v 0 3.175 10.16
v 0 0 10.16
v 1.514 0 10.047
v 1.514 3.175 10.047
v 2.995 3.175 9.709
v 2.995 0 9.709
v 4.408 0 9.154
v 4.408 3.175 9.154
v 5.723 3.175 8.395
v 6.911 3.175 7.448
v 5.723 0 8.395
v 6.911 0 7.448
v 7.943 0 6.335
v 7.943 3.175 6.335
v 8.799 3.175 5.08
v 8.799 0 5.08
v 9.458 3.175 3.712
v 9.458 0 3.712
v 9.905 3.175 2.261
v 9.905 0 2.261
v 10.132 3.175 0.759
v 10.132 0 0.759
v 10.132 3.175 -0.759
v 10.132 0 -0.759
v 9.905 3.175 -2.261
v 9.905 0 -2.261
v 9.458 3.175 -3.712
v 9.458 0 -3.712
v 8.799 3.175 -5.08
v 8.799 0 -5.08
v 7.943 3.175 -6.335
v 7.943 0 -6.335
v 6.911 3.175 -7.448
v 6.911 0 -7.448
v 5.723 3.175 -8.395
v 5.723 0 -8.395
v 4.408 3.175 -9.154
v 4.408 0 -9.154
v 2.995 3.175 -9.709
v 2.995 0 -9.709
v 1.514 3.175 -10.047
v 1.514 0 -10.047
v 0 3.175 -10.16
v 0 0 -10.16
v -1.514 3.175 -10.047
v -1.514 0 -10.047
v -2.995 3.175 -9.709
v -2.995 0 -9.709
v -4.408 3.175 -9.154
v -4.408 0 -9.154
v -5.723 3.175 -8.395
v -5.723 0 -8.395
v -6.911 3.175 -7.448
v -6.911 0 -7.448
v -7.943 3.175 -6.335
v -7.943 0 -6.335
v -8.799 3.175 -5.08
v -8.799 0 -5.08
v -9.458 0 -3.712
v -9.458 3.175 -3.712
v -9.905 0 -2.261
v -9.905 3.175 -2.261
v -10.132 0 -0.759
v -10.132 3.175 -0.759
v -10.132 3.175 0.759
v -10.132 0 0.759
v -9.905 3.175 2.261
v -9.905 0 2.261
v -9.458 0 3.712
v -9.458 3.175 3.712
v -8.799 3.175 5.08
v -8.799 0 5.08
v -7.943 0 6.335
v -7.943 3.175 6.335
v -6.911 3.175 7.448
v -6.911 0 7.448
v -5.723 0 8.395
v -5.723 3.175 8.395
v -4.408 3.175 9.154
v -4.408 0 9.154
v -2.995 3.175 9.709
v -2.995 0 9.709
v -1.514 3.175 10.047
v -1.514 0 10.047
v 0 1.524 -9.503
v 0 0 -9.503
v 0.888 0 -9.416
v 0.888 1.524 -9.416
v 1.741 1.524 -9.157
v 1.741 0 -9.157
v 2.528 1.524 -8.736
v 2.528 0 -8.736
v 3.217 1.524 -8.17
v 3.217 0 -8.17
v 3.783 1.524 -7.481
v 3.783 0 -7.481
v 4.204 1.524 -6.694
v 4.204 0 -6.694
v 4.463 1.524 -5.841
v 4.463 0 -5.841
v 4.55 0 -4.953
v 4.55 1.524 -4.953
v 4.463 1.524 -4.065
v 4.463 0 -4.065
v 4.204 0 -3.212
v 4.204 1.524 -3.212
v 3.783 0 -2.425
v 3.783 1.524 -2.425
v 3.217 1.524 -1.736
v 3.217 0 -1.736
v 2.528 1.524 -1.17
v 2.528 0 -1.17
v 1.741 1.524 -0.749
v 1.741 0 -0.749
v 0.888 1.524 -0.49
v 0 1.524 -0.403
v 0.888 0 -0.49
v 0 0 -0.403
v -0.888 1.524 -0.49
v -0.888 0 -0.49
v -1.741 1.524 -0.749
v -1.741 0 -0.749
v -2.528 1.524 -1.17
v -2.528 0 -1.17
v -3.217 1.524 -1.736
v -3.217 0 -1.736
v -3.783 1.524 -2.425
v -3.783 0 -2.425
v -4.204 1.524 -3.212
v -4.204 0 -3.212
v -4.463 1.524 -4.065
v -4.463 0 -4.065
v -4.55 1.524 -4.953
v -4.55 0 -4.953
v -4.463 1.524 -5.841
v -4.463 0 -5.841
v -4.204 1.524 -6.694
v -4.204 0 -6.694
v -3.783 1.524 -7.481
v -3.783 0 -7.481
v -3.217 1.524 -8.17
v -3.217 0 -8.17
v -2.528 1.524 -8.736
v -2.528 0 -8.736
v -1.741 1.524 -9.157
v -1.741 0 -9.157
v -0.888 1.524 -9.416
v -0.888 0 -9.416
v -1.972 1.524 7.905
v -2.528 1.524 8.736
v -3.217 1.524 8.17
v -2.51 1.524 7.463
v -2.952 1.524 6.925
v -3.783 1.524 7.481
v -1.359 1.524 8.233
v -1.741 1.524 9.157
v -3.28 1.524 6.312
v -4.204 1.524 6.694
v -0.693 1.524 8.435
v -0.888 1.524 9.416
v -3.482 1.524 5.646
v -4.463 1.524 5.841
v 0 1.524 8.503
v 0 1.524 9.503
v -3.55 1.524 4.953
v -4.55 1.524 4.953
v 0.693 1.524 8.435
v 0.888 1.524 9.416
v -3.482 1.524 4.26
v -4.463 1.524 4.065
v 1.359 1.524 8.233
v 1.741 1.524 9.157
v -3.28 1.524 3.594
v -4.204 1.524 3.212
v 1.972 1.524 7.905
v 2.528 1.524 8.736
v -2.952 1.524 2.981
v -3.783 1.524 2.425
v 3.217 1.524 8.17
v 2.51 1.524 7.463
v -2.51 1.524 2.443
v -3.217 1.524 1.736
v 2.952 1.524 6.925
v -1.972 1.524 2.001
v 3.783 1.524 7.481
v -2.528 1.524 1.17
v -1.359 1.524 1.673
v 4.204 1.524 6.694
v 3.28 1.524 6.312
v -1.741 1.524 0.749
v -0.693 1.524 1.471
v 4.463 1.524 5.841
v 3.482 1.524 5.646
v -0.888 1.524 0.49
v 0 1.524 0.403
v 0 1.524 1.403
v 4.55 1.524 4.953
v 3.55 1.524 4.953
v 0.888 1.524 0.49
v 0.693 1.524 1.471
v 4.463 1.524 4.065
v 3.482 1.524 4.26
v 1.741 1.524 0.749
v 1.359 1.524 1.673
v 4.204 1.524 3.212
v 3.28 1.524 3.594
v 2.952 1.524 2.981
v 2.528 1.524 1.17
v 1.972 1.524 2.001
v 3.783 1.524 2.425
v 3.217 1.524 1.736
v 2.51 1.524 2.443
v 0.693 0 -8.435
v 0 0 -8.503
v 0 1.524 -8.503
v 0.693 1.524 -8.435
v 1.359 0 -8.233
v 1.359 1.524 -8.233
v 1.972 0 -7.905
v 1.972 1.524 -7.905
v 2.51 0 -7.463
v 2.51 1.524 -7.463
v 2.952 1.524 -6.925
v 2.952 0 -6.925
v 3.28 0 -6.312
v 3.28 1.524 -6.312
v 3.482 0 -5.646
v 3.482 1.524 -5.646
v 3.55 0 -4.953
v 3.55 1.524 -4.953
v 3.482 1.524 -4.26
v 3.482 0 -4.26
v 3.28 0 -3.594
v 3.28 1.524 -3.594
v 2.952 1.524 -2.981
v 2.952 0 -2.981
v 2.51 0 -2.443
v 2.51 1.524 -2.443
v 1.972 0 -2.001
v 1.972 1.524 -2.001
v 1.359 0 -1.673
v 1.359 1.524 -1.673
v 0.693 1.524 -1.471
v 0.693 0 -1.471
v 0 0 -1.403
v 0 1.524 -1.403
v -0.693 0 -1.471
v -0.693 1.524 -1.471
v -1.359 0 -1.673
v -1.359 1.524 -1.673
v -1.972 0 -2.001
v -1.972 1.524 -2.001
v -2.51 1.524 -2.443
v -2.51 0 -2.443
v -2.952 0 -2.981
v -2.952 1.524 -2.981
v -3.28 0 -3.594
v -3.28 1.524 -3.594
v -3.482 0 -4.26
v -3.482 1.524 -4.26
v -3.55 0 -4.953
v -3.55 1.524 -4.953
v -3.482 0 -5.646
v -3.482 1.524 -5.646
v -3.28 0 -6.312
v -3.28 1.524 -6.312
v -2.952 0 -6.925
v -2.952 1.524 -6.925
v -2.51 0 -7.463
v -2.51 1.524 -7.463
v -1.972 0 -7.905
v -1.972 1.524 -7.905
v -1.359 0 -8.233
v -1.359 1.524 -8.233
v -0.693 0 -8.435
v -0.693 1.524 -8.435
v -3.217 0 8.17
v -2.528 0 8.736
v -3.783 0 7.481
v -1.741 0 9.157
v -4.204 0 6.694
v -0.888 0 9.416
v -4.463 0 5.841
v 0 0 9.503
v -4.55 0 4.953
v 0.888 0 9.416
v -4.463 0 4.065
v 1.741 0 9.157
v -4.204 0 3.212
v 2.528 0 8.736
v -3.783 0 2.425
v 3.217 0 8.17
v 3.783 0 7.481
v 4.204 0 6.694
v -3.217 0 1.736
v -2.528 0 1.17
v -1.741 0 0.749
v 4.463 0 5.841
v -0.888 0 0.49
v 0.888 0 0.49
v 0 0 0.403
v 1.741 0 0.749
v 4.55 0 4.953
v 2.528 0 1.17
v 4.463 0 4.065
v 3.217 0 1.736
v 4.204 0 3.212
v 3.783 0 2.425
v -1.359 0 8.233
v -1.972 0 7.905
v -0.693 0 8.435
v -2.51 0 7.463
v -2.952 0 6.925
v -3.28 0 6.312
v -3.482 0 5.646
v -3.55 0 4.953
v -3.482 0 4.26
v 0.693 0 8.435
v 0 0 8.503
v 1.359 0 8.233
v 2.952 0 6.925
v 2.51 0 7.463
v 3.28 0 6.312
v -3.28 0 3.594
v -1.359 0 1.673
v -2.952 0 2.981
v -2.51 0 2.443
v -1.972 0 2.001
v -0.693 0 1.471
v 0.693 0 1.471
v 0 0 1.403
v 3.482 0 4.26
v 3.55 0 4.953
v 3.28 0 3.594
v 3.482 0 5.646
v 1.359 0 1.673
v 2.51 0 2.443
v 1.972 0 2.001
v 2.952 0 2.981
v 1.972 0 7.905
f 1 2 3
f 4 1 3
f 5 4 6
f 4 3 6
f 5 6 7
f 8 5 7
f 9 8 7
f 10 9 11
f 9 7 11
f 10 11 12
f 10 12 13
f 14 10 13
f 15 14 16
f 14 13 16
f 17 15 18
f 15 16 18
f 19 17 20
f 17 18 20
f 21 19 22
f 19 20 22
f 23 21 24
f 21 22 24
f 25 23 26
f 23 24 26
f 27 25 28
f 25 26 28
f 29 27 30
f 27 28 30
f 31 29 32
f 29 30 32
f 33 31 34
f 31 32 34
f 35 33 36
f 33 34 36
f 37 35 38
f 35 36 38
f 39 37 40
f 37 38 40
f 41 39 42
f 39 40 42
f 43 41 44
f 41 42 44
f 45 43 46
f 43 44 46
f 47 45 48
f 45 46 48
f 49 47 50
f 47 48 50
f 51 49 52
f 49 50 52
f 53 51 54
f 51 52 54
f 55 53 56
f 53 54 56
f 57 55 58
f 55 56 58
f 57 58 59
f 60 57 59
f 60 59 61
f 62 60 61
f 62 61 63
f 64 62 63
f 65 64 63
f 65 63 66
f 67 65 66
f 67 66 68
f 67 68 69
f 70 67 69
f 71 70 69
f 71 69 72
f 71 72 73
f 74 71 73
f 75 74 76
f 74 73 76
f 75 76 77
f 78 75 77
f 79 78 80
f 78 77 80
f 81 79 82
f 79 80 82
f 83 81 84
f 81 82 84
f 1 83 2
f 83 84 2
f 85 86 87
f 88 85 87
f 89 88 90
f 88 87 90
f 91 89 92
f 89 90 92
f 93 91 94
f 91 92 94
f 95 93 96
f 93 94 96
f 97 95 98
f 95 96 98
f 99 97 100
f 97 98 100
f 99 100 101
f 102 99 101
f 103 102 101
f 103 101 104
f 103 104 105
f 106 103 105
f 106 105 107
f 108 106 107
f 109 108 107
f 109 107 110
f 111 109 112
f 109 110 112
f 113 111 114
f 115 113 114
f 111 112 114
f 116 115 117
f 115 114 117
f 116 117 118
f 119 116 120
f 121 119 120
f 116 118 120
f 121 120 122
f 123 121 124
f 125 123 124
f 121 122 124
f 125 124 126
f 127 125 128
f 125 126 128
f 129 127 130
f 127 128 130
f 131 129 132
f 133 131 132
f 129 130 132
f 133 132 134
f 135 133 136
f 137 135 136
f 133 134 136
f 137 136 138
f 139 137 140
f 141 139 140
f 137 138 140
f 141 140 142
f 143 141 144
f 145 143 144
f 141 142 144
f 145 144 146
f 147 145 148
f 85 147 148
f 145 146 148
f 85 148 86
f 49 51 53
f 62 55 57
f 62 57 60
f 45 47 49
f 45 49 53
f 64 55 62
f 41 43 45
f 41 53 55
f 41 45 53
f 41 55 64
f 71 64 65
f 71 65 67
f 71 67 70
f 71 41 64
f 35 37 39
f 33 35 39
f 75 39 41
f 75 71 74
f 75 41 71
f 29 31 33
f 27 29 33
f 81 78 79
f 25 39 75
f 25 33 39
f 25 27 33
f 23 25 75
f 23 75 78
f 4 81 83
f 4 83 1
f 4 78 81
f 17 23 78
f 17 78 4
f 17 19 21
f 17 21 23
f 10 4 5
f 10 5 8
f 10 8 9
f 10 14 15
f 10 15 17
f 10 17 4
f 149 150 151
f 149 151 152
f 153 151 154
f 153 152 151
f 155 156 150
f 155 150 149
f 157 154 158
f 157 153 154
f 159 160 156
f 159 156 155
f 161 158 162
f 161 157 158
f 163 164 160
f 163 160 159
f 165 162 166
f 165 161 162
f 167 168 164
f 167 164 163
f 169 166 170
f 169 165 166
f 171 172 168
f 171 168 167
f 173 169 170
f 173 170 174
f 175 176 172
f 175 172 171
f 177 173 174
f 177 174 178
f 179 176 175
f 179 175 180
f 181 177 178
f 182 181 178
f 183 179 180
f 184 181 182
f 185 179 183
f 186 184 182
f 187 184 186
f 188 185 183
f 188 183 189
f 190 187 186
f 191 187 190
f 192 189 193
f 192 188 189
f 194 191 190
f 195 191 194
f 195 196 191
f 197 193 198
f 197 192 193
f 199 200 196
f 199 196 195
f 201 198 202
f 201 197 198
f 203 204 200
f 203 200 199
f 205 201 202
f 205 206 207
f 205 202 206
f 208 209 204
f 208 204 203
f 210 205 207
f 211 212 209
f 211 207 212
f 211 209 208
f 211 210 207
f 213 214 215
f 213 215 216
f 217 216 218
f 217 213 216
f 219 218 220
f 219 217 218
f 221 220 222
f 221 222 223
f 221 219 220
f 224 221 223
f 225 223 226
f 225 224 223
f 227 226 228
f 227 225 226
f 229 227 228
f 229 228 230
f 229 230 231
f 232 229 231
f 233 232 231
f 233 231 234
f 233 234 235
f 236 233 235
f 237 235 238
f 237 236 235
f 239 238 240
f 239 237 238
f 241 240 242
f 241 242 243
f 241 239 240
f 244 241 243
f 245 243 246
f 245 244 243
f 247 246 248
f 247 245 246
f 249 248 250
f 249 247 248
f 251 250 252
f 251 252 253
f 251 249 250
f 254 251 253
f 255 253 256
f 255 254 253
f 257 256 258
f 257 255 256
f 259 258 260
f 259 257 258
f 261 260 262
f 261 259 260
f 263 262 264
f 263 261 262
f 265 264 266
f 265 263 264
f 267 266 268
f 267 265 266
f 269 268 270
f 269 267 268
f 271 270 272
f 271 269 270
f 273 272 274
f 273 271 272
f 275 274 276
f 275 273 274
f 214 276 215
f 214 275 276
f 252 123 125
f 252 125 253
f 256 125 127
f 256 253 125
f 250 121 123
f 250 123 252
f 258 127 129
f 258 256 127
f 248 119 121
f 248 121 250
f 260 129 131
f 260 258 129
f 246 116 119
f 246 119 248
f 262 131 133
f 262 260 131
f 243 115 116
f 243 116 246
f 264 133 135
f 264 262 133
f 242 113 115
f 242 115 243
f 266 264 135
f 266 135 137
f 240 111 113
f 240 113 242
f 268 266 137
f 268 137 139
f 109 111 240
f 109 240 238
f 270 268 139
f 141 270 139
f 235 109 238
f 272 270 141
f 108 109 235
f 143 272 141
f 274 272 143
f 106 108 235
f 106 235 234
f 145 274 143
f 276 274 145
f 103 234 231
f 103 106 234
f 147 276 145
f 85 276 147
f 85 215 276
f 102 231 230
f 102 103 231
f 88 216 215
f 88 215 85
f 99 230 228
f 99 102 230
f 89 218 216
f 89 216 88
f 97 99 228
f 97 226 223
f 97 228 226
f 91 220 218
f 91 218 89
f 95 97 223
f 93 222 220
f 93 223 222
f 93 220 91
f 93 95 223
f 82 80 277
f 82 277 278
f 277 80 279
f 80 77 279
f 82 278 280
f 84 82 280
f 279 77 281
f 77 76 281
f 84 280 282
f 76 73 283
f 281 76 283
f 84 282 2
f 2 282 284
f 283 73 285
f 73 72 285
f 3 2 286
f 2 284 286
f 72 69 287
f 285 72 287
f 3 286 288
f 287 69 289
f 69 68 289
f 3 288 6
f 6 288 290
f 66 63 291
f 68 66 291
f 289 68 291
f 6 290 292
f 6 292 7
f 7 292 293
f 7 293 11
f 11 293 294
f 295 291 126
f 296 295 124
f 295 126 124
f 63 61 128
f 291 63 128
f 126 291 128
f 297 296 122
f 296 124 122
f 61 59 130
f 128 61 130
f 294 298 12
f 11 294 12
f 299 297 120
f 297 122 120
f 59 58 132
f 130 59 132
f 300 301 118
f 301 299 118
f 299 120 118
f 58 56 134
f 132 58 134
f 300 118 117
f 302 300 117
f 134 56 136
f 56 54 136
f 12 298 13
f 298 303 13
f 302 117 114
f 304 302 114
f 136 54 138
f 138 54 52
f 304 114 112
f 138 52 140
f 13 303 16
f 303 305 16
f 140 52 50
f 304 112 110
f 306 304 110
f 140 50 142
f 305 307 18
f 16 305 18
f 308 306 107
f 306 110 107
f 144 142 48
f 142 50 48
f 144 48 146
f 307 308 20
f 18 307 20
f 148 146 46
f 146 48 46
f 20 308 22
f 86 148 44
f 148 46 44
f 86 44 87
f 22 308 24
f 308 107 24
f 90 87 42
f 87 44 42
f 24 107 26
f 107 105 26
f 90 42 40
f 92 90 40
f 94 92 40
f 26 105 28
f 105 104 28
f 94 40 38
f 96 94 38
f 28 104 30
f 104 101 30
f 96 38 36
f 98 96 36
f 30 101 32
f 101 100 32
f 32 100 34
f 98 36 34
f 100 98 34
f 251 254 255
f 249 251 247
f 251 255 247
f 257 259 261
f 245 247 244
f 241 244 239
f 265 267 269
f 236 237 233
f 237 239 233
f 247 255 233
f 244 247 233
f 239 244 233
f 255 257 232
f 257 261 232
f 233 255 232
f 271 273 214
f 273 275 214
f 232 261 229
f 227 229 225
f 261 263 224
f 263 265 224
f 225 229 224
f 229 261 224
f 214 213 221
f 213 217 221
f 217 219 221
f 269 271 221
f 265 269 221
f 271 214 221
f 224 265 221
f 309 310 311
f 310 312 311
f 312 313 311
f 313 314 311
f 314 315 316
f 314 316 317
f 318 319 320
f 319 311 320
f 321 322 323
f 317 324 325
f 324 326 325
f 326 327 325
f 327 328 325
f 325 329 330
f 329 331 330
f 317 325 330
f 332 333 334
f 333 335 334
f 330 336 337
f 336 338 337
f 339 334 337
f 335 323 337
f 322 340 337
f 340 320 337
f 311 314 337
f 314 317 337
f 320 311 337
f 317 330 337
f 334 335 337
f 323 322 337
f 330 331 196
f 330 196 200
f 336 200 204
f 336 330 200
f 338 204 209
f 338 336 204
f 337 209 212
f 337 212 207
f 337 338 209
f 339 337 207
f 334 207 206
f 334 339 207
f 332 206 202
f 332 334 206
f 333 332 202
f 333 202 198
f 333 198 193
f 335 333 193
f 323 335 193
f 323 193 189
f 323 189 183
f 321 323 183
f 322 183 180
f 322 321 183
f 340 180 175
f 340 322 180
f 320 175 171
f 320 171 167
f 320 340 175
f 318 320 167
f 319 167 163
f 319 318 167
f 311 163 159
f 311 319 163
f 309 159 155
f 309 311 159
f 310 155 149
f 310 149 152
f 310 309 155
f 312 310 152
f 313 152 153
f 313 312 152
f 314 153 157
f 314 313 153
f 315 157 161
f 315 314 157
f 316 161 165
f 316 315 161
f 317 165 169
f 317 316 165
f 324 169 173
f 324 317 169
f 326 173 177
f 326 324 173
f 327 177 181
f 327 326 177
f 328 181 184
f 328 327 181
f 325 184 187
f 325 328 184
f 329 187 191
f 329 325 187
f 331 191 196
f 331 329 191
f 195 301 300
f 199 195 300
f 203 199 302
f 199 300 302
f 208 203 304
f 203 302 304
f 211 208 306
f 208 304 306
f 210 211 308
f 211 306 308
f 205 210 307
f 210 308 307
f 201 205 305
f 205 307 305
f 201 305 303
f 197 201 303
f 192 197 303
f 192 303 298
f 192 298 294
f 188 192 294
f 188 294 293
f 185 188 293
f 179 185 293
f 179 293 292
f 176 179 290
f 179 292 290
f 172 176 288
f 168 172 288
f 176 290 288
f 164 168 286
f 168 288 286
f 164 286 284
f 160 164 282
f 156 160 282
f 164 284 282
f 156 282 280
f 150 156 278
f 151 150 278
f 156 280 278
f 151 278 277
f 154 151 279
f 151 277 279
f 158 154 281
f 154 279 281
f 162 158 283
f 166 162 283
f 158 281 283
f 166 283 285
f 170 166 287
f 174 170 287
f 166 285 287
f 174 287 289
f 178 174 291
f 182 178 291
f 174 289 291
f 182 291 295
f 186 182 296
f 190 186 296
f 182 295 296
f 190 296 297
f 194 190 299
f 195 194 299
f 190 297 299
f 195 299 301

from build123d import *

# Parameters (mm, degrees)
SKETCH1_R           = 10.16
SKETCH1_R_2         = 4.550000044
SKETCH1_R_3         = 3.550000044
BOSS_EXTRUDE1_DEPTH = 3.175
SKETCH2_R           = 4.550000044
SKETCH2_R_2         = 3.550000044
CUT_EXTRUDE1_DEPTH  = 1.524


with BuildPart() as part:
    # Sketch1 → Boss-Extrude1 (new body)
    # profile 1 of 5: a face of its own
    with BuildSketch(Plane(origin=(0, 0, 0), x_dir=(1, 0, 0), z_dir=(0, 1, 0))):
        with Locations(Location((0, 0, 0), (0, 0, 270))):
            Circle(SKETCH1_R)
        with Locations((0, 4.953)):
            Circle(SKETCH1_R_2, mode=Mode.SUBTRACT)
        with Locations((0, -4.953)):
            Circle(SKETCH1_R_2, mode=Mode.SUBTRACT)
    # profile 2 of 5: a face of its own
    with BuildSketch(Plane(origin=(0, 0, 0), x_dir=(1, 0, 0), z_dir=(0, 1, 0))):
        with Locations((0, 4.953)):
            Circle(SKETCH1_R_2)
        with Locations((0, 4.953)):
            Circle(SKETCH1_R_3, mode=Mode.SUBTRACT)
    # profile 3 of 5: a face of its own
    with BuildSketch(Plane(origin=(0, 0, 0), x_dir=(1, 0, 0), z_dir=(0, 1, 0))):
        with Locations((0, 4.953)):
            Circle(SKETCH1_R_3)
    # profile 4 of 5: a face of its own
    with BuildSketch(Plane(origin=(0, 0, 0), x_dir=(1, 0, 0), z_dir=(0, 1, 0))):
        with Locations((0, -4.953)):
            Circle(SKETCH1_R_2)
        with Locations((0, -4.953)):
            Circle(SKETCH1_R_3, mode=Mode.SUBTRACT)
    # profile 5 of 5: a face of its own
    with BuildSketch(Plane(origin=(0, 0, 0), x_dir=(1, 0, 0), z_dir=(0, 1, 0))):
        with Locations((0, -4.953)):
            Circle(SKETCH1_R_3)
    extrude(amount=BOSS_EXTRUDE1_DEPTH)

    # Sketch2 → Cut-Extrude1 (cut)
    # profile 1 of 2: a face of its own
    with BuildSketch(Plane.XZ):
        with Locations(Location((0, -4.953, 0), (0, 0, 270))):
            Circle(SKETCH2_R)
        with Locations(Location((0, -4.953, 0), (0, 0, 270))):
            Circle(SKETCH2_R_2, mode=Mode.SUBTRACT)
    # profile 2 of 2: a face of its own
    with BuildSketch(Plane.XZ):
        with Locations(Location((0, 4.953, 0), (0, 0, 270))):
            Circle(SKETCH2_R)
        with Locations(Location((0, 4.953, 0), (0, 0, 270))):
            Circle(SKETCH2_R_2, mode=Mode.SUBTRACT)
    extrude(amount=-CUT_EXTRUDE1_DEPTH, mode=Mode.SUBTRACT)


solid = part.part
